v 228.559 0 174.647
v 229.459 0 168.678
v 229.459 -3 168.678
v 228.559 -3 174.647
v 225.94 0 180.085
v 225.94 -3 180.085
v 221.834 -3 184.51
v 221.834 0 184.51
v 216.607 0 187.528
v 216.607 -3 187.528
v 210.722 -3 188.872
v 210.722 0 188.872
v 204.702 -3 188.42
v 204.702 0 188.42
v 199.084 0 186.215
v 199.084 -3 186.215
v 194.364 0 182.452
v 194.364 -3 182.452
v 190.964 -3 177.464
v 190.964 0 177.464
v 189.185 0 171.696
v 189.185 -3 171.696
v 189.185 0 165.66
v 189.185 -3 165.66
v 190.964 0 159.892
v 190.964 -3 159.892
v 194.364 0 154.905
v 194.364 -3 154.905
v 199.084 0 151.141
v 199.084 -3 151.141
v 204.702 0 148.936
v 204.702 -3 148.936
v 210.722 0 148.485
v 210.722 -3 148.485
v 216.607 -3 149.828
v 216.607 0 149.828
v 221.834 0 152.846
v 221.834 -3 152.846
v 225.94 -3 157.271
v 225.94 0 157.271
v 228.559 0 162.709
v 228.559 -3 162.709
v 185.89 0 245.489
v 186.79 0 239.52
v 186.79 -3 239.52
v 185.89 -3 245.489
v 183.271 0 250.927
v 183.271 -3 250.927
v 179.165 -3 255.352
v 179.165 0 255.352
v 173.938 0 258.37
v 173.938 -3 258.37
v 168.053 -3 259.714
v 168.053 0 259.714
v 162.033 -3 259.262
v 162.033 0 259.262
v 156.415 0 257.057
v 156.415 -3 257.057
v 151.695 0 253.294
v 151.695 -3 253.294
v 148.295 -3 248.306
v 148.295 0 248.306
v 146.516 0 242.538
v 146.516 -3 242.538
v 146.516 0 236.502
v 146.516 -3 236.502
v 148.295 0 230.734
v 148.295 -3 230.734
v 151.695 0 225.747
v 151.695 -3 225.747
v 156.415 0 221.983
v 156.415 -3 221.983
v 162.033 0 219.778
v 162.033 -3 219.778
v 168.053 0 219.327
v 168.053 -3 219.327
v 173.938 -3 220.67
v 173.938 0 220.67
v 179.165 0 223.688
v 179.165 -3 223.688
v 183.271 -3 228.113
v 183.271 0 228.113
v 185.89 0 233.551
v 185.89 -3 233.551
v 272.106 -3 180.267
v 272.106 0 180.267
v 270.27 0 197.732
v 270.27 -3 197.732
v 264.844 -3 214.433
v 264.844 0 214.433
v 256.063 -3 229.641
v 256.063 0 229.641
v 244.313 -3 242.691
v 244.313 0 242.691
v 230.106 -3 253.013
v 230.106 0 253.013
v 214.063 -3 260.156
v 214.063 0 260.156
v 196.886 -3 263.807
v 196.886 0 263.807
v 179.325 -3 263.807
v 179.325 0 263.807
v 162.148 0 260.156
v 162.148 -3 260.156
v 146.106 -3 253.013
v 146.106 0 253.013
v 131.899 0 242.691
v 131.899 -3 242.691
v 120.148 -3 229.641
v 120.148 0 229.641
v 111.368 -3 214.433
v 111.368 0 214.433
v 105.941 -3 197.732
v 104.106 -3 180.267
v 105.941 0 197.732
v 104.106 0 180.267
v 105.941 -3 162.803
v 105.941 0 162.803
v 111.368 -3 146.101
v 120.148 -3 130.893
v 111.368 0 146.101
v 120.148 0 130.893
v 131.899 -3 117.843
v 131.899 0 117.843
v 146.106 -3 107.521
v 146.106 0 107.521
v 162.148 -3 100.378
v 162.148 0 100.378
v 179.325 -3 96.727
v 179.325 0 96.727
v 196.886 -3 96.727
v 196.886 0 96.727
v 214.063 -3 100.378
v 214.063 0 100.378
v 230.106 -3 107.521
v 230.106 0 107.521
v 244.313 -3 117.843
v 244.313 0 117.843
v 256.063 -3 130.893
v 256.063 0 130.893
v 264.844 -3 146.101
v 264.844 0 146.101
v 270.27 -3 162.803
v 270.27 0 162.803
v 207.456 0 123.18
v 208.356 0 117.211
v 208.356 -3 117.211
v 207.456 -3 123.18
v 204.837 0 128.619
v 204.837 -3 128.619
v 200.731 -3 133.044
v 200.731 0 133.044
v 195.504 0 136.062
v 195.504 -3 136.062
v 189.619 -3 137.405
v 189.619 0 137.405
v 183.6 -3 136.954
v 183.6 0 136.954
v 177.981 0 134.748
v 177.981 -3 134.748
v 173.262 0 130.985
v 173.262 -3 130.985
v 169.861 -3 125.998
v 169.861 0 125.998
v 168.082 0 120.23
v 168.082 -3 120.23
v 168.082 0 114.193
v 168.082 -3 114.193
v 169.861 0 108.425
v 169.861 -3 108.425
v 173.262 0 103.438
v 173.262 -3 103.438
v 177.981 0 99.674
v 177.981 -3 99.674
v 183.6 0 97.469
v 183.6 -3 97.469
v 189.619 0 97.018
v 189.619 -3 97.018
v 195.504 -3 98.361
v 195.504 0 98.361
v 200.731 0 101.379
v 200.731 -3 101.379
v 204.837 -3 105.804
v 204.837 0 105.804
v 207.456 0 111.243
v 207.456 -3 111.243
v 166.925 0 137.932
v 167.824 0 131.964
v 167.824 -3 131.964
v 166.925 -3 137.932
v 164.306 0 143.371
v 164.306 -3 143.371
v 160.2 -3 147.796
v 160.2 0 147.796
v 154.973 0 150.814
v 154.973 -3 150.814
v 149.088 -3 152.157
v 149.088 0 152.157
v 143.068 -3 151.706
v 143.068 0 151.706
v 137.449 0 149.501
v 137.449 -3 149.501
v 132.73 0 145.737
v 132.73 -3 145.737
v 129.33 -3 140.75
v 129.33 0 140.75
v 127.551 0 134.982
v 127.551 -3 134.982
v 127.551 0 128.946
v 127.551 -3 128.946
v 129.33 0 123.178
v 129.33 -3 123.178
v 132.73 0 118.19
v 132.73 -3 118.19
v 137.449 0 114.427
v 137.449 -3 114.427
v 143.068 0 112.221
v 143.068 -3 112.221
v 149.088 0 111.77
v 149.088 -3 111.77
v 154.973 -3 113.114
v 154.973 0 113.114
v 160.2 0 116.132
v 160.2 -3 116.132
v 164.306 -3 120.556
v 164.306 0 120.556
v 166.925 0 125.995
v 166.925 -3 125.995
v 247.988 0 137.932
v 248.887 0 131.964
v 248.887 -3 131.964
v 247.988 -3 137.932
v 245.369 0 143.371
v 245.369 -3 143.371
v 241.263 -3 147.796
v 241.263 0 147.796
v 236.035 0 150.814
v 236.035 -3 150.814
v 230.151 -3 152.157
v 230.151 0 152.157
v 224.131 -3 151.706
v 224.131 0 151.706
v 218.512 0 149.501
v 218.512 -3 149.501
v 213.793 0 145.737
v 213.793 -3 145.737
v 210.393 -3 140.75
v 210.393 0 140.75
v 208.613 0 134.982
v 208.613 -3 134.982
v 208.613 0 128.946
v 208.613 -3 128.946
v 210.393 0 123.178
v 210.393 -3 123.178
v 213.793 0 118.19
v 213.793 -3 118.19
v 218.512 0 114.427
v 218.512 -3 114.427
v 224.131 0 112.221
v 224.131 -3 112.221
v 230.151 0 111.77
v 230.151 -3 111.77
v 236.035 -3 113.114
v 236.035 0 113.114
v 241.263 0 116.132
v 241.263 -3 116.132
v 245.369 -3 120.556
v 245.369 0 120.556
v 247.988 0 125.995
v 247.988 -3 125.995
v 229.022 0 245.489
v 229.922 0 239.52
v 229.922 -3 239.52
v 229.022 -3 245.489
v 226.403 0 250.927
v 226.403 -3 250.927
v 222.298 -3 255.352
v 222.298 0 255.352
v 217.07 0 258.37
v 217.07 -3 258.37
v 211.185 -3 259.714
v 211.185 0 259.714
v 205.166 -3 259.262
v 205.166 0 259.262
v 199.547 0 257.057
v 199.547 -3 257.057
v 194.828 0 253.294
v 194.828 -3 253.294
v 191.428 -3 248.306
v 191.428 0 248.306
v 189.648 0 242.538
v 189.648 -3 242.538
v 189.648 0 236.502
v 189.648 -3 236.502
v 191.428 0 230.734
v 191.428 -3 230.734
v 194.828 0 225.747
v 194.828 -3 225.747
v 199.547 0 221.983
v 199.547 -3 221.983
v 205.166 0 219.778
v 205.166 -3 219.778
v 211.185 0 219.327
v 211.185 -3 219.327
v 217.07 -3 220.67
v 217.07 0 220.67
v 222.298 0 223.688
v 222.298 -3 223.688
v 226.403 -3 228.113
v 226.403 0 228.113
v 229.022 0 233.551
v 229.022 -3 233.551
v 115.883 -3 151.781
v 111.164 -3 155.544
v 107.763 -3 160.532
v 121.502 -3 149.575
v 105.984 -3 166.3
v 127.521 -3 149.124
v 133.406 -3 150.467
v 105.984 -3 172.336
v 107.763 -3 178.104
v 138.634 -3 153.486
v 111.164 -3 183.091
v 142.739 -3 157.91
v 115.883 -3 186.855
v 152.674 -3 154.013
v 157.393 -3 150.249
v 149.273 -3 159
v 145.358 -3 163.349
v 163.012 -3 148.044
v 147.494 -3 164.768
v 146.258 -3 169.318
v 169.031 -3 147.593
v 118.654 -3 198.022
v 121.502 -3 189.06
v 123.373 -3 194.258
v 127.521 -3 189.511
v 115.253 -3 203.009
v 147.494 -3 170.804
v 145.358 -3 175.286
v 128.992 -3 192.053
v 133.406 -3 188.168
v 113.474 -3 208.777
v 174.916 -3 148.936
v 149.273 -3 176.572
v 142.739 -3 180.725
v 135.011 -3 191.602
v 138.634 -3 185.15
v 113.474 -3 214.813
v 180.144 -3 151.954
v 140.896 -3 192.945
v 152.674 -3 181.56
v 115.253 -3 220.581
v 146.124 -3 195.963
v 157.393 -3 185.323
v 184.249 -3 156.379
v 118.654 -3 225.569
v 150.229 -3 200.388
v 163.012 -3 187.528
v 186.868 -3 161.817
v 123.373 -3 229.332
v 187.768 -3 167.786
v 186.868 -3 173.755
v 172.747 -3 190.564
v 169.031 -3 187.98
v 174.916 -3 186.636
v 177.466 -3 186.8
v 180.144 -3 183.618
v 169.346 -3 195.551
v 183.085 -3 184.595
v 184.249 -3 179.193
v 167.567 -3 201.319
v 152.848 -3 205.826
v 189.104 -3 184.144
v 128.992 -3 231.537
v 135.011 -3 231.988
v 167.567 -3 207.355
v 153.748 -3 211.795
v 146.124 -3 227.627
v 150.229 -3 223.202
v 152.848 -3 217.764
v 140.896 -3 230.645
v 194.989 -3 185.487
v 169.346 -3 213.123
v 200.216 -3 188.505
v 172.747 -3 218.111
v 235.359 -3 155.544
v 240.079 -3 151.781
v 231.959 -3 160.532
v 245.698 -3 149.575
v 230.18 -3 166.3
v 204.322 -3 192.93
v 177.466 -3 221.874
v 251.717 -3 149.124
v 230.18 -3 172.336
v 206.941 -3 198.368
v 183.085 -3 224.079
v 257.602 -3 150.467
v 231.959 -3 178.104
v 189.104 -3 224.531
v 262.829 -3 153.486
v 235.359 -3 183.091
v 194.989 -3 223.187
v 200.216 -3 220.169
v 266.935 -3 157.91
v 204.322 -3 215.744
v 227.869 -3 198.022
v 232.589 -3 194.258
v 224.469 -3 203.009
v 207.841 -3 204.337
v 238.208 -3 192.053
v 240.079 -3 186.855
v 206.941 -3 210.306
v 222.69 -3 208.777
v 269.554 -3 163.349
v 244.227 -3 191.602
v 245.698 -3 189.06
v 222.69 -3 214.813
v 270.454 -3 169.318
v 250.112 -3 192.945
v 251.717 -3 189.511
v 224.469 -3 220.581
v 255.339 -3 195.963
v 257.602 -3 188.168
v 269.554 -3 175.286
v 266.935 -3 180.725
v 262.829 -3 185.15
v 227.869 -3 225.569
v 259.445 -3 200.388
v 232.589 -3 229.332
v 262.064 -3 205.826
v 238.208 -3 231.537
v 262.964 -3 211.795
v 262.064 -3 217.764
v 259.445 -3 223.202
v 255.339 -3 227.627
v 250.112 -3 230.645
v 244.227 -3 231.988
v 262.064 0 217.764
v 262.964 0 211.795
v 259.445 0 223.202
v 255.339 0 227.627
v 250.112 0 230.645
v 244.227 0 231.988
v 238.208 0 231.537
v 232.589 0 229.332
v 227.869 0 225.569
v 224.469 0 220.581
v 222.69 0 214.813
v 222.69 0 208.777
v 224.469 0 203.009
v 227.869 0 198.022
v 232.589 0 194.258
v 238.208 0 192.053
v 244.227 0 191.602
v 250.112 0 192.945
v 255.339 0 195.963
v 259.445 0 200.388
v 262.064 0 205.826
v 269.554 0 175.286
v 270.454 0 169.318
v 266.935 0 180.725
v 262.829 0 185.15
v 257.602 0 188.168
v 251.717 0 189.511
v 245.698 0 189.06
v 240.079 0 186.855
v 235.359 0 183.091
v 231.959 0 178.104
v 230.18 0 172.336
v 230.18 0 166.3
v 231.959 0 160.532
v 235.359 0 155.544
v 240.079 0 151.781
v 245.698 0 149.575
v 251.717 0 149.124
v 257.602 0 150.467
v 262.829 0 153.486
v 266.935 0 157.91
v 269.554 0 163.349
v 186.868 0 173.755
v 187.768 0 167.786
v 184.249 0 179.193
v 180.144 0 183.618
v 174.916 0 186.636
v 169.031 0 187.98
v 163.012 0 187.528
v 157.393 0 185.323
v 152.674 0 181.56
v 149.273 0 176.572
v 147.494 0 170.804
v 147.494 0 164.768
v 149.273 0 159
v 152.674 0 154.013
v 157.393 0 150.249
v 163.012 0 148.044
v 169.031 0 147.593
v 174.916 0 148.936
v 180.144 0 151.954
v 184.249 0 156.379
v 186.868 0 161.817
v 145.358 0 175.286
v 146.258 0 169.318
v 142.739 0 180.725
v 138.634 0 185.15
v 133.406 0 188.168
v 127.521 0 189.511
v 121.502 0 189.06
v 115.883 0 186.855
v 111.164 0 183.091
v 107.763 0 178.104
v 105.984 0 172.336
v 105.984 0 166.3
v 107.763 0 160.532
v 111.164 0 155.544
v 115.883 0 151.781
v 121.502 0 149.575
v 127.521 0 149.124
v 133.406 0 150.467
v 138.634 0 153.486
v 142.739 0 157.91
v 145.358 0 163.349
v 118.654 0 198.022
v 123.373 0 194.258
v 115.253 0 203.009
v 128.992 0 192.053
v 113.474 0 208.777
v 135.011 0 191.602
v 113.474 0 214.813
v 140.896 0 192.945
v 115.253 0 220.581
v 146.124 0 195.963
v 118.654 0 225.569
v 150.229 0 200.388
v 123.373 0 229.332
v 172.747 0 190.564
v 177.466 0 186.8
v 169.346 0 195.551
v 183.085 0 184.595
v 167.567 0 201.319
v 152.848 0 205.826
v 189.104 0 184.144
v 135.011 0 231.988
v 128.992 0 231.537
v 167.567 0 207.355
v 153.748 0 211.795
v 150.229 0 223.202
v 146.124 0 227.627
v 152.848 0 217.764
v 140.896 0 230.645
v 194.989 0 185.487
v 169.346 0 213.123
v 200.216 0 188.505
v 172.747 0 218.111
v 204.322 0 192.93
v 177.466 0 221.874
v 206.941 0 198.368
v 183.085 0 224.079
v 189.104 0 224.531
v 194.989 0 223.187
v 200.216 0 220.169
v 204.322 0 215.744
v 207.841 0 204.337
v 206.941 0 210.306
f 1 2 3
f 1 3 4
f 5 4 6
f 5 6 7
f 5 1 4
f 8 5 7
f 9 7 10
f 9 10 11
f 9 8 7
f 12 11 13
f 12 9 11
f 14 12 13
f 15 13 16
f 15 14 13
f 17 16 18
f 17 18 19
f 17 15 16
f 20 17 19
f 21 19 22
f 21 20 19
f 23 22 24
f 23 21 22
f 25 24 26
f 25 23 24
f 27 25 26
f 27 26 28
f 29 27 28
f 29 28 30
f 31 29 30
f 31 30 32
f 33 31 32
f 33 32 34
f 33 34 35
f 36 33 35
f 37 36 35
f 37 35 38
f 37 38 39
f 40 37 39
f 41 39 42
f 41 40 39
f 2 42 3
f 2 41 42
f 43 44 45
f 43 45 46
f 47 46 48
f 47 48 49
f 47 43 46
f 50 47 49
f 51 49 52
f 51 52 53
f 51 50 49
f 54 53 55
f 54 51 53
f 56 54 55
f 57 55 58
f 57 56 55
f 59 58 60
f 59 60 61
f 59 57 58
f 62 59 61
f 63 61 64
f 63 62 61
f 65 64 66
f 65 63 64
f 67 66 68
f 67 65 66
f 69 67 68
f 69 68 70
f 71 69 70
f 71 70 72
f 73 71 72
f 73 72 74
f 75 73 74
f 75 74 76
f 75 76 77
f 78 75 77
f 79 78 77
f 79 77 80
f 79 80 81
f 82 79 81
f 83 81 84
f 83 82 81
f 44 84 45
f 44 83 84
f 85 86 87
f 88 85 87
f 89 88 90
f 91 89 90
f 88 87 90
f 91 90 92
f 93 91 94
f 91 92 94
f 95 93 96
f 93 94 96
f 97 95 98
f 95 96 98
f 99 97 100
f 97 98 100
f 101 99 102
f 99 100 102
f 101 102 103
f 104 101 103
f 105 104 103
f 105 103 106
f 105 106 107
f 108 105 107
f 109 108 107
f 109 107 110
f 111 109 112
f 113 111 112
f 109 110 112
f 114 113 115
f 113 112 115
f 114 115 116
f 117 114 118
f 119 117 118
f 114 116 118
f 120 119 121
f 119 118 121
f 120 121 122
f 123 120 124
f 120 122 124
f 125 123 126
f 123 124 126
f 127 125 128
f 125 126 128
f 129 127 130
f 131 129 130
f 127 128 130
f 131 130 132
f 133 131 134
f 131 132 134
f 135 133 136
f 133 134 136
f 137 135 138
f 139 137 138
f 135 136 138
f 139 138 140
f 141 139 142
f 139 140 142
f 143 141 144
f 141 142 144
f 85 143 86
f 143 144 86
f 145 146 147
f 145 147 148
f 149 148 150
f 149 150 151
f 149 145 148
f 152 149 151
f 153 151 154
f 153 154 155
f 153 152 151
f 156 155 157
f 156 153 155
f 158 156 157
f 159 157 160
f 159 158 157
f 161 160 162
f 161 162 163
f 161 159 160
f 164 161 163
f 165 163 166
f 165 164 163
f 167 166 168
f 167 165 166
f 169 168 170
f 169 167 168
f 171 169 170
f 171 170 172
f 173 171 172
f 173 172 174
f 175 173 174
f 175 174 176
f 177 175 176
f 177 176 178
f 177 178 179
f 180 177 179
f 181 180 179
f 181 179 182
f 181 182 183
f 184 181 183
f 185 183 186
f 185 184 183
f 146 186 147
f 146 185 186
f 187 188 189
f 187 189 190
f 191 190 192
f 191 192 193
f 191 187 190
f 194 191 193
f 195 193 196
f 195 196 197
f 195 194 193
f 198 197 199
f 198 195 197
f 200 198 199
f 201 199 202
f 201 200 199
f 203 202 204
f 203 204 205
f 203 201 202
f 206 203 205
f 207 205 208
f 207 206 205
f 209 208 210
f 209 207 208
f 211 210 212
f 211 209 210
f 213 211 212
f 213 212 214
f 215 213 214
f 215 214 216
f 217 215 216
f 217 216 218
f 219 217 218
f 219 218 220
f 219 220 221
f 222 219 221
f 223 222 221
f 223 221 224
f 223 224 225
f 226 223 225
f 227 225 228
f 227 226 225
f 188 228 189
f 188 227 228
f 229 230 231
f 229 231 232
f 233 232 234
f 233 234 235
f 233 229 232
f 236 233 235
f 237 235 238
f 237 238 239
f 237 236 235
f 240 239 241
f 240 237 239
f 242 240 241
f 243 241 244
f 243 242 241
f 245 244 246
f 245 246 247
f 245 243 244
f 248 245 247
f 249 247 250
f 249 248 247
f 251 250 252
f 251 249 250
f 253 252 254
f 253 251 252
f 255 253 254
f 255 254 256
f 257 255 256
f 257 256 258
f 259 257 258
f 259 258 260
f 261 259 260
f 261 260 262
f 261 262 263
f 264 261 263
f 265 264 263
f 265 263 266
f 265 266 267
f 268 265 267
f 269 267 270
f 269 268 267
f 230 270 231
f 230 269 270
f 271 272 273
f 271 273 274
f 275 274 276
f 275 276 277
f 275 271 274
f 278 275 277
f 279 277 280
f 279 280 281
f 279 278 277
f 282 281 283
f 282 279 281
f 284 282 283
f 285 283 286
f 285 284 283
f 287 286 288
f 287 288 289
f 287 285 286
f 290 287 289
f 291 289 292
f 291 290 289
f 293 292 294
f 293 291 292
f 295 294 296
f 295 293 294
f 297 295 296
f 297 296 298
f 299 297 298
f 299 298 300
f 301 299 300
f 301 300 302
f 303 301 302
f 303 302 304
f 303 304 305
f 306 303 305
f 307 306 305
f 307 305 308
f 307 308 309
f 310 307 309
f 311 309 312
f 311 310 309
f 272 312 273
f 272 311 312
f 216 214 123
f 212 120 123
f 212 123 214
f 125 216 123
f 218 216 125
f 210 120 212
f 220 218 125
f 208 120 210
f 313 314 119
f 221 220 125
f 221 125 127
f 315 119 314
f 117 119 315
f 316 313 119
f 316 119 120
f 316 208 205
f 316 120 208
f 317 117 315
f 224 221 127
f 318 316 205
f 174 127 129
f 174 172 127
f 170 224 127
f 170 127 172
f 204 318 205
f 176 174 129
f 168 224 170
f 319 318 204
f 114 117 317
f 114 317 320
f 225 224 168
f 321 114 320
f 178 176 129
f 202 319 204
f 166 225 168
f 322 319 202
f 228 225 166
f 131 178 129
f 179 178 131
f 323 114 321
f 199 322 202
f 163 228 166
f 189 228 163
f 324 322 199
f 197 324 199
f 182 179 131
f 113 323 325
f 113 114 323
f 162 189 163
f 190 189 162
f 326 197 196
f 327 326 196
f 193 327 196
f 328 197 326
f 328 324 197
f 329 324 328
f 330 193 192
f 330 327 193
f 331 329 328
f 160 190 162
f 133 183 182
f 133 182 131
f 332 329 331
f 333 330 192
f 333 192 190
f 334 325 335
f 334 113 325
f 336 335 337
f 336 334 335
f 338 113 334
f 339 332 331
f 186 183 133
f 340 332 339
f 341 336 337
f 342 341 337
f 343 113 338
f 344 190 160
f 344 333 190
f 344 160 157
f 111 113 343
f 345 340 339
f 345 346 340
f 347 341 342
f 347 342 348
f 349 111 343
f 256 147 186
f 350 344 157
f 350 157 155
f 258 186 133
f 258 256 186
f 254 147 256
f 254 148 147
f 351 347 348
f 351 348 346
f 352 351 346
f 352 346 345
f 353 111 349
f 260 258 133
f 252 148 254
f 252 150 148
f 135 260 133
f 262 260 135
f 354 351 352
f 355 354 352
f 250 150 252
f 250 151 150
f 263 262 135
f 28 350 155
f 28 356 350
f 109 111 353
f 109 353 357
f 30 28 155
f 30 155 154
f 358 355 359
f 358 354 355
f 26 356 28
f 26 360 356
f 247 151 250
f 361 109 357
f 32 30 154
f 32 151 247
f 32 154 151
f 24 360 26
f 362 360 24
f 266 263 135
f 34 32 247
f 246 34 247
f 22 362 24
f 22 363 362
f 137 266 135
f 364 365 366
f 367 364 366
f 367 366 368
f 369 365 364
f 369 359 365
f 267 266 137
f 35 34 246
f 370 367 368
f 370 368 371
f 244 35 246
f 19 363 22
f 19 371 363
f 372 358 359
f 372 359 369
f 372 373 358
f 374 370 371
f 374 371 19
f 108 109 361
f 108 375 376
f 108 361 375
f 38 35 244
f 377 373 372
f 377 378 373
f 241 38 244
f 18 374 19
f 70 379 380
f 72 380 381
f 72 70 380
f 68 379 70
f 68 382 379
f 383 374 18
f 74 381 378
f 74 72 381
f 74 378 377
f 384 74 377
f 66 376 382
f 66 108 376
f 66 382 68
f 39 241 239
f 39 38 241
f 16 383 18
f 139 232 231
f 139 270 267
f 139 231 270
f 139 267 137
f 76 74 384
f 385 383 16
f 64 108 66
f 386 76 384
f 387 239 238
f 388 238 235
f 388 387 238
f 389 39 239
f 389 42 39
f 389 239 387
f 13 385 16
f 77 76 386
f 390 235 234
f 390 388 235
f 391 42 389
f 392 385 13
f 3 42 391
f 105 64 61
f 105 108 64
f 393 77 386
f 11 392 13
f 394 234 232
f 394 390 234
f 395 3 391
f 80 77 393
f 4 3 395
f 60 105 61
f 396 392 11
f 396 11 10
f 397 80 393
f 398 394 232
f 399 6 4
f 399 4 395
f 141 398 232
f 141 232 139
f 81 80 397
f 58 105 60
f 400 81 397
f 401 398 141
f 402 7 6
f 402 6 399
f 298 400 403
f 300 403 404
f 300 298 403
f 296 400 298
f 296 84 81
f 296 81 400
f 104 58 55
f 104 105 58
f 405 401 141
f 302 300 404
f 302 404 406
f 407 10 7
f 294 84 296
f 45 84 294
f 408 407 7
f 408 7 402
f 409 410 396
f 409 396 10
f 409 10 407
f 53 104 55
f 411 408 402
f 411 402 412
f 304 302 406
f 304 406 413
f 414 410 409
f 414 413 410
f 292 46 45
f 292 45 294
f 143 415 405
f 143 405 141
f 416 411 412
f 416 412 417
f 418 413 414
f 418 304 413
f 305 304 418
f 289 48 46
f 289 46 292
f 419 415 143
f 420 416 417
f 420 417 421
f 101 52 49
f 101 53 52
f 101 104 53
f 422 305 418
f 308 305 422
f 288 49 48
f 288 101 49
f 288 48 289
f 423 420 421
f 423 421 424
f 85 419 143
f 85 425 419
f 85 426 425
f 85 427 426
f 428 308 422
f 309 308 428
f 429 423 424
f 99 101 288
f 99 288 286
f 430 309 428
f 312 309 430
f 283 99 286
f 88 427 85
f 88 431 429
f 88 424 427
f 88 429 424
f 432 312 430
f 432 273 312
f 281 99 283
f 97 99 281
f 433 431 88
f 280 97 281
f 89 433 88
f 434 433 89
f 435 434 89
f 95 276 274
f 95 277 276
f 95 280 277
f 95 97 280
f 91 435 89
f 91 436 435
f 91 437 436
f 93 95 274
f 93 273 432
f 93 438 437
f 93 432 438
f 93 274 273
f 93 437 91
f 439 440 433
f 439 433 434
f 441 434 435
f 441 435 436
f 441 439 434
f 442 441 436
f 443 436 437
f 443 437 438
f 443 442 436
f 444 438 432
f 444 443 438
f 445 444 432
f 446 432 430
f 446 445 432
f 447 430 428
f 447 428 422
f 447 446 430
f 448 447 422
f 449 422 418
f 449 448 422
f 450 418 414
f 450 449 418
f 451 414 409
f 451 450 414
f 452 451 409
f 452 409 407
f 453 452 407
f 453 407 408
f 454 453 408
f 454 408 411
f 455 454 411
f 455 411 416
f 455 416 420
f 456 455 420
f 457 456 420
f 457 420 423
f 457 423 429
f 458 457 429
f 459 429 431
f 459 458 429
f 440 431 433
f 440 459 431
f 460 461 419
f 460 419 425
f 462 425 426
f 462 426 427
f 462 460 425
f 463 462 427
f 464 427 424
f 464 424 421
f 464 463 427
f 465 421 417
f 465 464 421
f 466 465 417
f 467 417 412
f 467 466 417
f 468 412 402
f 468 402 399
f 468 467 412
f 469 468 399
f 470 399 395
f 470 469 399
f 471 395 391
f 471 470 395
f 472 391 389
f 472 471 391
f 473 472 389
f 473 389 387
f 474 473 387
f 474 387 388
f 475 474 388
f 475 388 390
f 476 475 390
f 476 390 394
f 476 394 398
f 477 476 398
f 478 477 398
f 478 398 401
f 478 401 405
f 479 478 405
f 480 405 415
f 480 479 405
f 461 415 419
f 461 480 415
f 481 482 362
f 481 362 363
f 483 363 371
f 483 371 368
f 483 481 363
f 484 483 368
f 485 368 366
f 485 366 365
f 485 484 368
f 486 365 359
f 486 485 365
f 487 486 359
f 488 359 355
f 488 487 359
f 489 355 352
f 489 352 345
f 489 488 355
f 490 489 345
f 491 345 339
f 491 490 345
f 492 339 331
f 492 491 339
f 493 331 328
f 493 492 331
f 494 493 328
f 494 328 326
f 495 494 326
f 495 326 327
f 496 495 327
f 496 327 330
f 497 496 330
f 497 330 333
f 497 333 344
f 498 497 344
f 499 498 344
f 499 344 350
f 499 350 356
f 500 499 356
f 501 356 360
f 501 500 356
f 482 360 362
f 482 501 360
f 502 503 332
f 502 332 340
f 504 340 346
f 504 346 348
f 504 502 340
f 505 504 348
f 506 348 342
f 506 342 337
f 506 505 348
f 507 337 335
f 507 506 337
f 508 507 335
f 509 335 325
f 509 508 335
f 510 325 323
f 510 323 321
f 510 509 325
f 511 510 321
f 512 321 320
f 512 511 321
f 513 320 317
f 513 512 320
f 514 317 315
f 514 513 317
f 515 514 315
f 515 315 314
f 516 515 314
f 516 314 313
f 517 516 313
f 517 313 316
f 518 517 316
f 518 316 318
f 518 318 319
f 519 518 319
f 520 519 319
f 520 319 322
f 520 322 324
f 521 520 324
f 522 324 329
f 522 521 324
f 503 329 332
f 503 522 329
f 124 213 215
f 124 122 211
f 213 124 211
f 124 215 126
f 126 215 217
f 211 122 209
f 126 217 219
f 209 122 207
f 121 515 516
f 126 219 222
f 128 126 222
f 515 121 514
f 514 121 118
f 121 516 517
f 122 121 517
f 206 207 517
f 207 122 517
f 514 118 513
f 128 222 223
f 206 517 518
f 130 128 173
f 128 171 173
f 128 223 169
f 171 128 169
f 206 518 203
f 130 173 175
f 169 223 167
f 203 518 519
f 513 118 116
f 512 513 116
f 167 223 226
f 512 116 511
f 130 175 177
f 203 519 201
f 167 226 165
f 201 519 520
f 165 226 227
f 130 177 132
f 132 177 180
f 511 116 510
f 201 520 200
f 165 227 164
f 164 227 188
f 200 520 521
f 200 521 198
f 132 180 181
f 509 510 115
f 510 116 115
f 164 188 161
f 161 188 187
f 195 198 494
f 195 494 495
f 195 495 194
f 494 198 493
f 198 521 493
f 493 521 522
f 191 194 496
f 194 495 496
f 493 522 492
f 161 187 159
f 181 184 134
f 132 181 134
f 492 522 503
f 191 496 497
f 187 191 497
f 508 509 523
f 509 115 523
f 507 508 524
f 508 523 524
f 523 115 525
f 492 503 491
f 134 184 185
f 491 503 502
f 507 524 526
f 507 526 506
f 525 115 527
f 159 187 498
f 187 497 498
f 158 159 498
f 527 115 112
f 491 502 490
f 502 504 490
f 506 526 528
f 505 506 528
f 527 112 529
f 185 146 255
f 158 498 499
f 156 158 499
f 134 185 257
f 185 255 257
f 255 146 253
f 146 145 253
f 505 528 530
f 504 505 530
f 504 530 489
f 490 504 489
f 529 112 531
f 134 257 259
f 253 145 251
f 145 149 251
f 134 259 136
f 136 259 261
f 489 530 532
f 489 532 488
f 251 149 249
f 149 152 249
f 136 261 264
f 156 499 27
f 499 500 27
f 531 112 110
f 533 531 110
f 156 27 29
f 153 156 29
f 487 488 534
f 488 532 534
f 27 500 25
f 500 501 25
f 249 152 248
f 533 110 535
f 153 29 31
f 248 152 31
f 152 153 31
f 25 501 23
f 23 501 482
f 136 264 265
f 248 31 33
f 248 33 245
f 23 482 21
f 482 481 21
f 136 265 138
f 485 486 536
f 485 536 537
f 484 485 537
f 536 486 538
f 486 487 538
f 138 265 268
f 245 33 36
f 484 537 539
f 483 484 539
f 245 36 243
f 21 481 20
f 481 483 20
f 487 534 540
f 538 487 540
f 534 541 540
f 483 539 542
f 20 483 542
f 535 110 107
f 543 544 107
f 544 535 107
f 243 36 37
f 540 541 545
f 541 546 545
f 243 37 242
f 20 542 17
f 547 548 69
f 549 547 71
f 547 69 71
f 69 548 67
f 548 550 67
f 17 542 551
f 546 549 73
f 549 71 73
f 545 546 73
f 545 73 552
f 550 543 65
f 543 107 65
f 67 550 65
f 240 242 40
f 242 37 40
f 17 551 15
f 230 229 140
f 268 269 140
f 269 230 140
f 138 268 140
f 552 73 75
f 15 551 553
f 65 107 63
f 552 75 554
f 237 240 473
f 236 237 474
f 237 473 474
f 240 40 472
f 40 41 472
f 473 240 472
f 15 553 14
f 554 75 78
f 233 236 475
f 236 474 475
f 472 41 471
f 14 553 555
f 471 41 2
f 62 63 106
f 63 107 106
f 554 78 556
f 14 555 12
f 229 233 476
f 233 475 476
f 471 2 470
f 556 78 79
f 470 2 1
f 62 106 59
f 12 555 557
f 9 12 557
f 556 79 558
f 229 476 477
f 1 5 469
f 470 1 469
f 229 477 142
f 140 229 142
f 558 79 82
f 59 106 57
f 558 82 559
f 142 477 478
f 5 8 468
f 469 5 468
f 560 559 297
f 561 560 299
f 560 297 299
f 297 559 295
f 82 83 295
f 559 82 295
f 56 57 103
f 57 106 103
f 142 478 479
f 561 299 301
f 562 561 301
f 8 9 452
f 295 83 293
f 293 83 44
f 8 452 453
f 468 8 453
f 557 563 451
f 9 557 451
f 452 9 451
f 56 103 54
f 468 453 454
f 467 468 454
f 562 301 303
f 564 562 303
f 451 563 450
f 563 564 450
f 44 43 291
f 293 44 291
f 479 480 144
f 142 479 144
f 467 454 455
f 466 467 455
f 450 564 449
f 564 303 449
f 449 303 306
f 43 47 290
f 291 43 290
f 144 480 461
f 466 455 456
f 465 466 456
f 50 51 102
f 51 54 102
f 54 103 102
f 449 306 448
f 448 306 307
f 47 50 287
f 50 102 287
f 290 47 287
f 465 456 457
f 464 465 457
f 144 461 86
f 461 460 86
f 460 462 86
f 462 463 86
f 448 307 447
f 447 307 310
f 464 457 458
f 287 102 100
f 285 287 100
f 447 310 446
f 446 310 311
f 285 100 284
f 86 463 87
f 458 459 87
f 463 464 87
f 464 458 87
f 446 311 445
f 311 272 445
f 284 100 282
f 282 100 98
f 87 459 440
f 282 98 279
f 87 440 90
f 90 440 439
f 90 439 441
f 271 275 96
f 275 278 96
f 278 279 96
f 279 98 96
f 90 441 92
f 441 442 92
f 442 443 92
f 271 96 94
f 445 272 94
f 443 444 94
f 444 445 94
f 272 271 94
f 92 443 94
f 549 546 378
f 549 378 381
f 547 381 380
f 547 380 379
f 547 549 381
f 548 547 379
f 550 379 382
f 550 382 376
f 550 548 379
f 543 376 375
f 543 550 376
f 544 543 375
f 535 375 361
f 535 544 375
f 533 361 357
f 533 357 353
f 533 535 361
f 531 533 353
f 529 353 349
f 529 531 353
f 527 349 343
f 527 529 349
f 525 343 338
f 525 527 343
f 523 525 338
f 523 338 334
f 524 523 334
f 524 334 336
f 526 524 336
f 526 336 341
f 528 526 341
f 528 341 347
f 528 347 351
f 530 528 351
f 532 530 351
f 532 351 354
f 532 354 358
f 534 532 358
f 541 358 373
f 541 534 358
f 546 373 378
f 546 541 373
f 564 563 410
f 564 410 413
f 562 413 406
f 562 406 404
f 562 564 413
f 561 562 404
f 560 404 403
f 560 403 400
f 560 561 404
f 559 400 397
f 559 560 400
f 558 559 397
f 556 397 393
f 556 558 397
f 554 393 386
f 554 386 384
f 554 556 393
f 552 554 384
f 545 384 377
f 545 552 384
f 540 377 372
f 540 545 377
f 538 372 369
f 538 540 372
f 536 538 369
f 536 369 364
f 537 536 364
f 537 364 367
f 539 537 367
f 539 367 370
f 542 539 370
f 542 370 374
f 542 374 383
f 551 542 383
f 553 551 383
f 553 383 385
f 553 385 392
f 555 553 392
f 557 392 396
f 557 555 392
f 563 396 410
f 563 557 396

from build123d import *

# Parameters (mm, degrees)
F0_R     = 84
F0_R_2   = 20.25
F1_DEPTH = 3


# Not quite as in the source:
# - a feature of the source that left no trace in its solid (it failed there, or was rolled back) is left out


with BuildPart() as f1:
    # F0 (on Front) → F1 (new body)
    with BuildSketch(Plane.XZ):
        with Locations((188.1058226409, 180.2671665321)):
            Circle(F0_R)
        with Locations((147.5744029219, 131.9637014691)):
            Circle(F0_R_2, mode=Mode.SUBTRACT)
        with Locations((126.008084946, 169.3176599356)):
            Circle(F0_R_2, mode=Mode.SUBTRACT)
        with Locations((188.1058226409, 117.2114711388)):
            Circle(F0_R_2, mode=Mode.SUBTRACT)
        with Locations((228.6372423598, 131.9637014691)):
            Circle(F0_R_2, mode=Mode.SUBTRACT)
        with Locations((167.5180891549, 167.7861717837)):
            Circle(F0_R_2, mode=Mode.SUBTRACT)
        with Locations((209.2085479005, 168.6781637011)):
            Circle(F0_R_2, mode=Mode.SUBTRACT)
        with Locations((250.2035603357, 169.3176599356)):
            Circle(F0_R_2, mode=Mode.SUBTRACT)
        with Locations((133.497988577, 211.7950142288)):
            Circle(F0_R_2, mode=Mode.SUBTRACT)
        with Locations((187.5908308672, 204.3371641115)):
            Circle(F0_R_2, mode=Mode.SUBTRACT)
        with Locations((242.7136567047, 211.7950142288)):
            Circle(F0_R_2, mode=Mode.SUBTRACT)
        with Locations((166.539504665, 239.5201381917)):
            Circle(F0_R_2, mode=Mode.SUBTRACT)
        with Locations((209.6721406168, 239.5201381917)):
            Circle(F0_R_2, mode=Mode.SUBTRACT)
    extrude(amount=F1_DEPTH)


solid = f1.part
